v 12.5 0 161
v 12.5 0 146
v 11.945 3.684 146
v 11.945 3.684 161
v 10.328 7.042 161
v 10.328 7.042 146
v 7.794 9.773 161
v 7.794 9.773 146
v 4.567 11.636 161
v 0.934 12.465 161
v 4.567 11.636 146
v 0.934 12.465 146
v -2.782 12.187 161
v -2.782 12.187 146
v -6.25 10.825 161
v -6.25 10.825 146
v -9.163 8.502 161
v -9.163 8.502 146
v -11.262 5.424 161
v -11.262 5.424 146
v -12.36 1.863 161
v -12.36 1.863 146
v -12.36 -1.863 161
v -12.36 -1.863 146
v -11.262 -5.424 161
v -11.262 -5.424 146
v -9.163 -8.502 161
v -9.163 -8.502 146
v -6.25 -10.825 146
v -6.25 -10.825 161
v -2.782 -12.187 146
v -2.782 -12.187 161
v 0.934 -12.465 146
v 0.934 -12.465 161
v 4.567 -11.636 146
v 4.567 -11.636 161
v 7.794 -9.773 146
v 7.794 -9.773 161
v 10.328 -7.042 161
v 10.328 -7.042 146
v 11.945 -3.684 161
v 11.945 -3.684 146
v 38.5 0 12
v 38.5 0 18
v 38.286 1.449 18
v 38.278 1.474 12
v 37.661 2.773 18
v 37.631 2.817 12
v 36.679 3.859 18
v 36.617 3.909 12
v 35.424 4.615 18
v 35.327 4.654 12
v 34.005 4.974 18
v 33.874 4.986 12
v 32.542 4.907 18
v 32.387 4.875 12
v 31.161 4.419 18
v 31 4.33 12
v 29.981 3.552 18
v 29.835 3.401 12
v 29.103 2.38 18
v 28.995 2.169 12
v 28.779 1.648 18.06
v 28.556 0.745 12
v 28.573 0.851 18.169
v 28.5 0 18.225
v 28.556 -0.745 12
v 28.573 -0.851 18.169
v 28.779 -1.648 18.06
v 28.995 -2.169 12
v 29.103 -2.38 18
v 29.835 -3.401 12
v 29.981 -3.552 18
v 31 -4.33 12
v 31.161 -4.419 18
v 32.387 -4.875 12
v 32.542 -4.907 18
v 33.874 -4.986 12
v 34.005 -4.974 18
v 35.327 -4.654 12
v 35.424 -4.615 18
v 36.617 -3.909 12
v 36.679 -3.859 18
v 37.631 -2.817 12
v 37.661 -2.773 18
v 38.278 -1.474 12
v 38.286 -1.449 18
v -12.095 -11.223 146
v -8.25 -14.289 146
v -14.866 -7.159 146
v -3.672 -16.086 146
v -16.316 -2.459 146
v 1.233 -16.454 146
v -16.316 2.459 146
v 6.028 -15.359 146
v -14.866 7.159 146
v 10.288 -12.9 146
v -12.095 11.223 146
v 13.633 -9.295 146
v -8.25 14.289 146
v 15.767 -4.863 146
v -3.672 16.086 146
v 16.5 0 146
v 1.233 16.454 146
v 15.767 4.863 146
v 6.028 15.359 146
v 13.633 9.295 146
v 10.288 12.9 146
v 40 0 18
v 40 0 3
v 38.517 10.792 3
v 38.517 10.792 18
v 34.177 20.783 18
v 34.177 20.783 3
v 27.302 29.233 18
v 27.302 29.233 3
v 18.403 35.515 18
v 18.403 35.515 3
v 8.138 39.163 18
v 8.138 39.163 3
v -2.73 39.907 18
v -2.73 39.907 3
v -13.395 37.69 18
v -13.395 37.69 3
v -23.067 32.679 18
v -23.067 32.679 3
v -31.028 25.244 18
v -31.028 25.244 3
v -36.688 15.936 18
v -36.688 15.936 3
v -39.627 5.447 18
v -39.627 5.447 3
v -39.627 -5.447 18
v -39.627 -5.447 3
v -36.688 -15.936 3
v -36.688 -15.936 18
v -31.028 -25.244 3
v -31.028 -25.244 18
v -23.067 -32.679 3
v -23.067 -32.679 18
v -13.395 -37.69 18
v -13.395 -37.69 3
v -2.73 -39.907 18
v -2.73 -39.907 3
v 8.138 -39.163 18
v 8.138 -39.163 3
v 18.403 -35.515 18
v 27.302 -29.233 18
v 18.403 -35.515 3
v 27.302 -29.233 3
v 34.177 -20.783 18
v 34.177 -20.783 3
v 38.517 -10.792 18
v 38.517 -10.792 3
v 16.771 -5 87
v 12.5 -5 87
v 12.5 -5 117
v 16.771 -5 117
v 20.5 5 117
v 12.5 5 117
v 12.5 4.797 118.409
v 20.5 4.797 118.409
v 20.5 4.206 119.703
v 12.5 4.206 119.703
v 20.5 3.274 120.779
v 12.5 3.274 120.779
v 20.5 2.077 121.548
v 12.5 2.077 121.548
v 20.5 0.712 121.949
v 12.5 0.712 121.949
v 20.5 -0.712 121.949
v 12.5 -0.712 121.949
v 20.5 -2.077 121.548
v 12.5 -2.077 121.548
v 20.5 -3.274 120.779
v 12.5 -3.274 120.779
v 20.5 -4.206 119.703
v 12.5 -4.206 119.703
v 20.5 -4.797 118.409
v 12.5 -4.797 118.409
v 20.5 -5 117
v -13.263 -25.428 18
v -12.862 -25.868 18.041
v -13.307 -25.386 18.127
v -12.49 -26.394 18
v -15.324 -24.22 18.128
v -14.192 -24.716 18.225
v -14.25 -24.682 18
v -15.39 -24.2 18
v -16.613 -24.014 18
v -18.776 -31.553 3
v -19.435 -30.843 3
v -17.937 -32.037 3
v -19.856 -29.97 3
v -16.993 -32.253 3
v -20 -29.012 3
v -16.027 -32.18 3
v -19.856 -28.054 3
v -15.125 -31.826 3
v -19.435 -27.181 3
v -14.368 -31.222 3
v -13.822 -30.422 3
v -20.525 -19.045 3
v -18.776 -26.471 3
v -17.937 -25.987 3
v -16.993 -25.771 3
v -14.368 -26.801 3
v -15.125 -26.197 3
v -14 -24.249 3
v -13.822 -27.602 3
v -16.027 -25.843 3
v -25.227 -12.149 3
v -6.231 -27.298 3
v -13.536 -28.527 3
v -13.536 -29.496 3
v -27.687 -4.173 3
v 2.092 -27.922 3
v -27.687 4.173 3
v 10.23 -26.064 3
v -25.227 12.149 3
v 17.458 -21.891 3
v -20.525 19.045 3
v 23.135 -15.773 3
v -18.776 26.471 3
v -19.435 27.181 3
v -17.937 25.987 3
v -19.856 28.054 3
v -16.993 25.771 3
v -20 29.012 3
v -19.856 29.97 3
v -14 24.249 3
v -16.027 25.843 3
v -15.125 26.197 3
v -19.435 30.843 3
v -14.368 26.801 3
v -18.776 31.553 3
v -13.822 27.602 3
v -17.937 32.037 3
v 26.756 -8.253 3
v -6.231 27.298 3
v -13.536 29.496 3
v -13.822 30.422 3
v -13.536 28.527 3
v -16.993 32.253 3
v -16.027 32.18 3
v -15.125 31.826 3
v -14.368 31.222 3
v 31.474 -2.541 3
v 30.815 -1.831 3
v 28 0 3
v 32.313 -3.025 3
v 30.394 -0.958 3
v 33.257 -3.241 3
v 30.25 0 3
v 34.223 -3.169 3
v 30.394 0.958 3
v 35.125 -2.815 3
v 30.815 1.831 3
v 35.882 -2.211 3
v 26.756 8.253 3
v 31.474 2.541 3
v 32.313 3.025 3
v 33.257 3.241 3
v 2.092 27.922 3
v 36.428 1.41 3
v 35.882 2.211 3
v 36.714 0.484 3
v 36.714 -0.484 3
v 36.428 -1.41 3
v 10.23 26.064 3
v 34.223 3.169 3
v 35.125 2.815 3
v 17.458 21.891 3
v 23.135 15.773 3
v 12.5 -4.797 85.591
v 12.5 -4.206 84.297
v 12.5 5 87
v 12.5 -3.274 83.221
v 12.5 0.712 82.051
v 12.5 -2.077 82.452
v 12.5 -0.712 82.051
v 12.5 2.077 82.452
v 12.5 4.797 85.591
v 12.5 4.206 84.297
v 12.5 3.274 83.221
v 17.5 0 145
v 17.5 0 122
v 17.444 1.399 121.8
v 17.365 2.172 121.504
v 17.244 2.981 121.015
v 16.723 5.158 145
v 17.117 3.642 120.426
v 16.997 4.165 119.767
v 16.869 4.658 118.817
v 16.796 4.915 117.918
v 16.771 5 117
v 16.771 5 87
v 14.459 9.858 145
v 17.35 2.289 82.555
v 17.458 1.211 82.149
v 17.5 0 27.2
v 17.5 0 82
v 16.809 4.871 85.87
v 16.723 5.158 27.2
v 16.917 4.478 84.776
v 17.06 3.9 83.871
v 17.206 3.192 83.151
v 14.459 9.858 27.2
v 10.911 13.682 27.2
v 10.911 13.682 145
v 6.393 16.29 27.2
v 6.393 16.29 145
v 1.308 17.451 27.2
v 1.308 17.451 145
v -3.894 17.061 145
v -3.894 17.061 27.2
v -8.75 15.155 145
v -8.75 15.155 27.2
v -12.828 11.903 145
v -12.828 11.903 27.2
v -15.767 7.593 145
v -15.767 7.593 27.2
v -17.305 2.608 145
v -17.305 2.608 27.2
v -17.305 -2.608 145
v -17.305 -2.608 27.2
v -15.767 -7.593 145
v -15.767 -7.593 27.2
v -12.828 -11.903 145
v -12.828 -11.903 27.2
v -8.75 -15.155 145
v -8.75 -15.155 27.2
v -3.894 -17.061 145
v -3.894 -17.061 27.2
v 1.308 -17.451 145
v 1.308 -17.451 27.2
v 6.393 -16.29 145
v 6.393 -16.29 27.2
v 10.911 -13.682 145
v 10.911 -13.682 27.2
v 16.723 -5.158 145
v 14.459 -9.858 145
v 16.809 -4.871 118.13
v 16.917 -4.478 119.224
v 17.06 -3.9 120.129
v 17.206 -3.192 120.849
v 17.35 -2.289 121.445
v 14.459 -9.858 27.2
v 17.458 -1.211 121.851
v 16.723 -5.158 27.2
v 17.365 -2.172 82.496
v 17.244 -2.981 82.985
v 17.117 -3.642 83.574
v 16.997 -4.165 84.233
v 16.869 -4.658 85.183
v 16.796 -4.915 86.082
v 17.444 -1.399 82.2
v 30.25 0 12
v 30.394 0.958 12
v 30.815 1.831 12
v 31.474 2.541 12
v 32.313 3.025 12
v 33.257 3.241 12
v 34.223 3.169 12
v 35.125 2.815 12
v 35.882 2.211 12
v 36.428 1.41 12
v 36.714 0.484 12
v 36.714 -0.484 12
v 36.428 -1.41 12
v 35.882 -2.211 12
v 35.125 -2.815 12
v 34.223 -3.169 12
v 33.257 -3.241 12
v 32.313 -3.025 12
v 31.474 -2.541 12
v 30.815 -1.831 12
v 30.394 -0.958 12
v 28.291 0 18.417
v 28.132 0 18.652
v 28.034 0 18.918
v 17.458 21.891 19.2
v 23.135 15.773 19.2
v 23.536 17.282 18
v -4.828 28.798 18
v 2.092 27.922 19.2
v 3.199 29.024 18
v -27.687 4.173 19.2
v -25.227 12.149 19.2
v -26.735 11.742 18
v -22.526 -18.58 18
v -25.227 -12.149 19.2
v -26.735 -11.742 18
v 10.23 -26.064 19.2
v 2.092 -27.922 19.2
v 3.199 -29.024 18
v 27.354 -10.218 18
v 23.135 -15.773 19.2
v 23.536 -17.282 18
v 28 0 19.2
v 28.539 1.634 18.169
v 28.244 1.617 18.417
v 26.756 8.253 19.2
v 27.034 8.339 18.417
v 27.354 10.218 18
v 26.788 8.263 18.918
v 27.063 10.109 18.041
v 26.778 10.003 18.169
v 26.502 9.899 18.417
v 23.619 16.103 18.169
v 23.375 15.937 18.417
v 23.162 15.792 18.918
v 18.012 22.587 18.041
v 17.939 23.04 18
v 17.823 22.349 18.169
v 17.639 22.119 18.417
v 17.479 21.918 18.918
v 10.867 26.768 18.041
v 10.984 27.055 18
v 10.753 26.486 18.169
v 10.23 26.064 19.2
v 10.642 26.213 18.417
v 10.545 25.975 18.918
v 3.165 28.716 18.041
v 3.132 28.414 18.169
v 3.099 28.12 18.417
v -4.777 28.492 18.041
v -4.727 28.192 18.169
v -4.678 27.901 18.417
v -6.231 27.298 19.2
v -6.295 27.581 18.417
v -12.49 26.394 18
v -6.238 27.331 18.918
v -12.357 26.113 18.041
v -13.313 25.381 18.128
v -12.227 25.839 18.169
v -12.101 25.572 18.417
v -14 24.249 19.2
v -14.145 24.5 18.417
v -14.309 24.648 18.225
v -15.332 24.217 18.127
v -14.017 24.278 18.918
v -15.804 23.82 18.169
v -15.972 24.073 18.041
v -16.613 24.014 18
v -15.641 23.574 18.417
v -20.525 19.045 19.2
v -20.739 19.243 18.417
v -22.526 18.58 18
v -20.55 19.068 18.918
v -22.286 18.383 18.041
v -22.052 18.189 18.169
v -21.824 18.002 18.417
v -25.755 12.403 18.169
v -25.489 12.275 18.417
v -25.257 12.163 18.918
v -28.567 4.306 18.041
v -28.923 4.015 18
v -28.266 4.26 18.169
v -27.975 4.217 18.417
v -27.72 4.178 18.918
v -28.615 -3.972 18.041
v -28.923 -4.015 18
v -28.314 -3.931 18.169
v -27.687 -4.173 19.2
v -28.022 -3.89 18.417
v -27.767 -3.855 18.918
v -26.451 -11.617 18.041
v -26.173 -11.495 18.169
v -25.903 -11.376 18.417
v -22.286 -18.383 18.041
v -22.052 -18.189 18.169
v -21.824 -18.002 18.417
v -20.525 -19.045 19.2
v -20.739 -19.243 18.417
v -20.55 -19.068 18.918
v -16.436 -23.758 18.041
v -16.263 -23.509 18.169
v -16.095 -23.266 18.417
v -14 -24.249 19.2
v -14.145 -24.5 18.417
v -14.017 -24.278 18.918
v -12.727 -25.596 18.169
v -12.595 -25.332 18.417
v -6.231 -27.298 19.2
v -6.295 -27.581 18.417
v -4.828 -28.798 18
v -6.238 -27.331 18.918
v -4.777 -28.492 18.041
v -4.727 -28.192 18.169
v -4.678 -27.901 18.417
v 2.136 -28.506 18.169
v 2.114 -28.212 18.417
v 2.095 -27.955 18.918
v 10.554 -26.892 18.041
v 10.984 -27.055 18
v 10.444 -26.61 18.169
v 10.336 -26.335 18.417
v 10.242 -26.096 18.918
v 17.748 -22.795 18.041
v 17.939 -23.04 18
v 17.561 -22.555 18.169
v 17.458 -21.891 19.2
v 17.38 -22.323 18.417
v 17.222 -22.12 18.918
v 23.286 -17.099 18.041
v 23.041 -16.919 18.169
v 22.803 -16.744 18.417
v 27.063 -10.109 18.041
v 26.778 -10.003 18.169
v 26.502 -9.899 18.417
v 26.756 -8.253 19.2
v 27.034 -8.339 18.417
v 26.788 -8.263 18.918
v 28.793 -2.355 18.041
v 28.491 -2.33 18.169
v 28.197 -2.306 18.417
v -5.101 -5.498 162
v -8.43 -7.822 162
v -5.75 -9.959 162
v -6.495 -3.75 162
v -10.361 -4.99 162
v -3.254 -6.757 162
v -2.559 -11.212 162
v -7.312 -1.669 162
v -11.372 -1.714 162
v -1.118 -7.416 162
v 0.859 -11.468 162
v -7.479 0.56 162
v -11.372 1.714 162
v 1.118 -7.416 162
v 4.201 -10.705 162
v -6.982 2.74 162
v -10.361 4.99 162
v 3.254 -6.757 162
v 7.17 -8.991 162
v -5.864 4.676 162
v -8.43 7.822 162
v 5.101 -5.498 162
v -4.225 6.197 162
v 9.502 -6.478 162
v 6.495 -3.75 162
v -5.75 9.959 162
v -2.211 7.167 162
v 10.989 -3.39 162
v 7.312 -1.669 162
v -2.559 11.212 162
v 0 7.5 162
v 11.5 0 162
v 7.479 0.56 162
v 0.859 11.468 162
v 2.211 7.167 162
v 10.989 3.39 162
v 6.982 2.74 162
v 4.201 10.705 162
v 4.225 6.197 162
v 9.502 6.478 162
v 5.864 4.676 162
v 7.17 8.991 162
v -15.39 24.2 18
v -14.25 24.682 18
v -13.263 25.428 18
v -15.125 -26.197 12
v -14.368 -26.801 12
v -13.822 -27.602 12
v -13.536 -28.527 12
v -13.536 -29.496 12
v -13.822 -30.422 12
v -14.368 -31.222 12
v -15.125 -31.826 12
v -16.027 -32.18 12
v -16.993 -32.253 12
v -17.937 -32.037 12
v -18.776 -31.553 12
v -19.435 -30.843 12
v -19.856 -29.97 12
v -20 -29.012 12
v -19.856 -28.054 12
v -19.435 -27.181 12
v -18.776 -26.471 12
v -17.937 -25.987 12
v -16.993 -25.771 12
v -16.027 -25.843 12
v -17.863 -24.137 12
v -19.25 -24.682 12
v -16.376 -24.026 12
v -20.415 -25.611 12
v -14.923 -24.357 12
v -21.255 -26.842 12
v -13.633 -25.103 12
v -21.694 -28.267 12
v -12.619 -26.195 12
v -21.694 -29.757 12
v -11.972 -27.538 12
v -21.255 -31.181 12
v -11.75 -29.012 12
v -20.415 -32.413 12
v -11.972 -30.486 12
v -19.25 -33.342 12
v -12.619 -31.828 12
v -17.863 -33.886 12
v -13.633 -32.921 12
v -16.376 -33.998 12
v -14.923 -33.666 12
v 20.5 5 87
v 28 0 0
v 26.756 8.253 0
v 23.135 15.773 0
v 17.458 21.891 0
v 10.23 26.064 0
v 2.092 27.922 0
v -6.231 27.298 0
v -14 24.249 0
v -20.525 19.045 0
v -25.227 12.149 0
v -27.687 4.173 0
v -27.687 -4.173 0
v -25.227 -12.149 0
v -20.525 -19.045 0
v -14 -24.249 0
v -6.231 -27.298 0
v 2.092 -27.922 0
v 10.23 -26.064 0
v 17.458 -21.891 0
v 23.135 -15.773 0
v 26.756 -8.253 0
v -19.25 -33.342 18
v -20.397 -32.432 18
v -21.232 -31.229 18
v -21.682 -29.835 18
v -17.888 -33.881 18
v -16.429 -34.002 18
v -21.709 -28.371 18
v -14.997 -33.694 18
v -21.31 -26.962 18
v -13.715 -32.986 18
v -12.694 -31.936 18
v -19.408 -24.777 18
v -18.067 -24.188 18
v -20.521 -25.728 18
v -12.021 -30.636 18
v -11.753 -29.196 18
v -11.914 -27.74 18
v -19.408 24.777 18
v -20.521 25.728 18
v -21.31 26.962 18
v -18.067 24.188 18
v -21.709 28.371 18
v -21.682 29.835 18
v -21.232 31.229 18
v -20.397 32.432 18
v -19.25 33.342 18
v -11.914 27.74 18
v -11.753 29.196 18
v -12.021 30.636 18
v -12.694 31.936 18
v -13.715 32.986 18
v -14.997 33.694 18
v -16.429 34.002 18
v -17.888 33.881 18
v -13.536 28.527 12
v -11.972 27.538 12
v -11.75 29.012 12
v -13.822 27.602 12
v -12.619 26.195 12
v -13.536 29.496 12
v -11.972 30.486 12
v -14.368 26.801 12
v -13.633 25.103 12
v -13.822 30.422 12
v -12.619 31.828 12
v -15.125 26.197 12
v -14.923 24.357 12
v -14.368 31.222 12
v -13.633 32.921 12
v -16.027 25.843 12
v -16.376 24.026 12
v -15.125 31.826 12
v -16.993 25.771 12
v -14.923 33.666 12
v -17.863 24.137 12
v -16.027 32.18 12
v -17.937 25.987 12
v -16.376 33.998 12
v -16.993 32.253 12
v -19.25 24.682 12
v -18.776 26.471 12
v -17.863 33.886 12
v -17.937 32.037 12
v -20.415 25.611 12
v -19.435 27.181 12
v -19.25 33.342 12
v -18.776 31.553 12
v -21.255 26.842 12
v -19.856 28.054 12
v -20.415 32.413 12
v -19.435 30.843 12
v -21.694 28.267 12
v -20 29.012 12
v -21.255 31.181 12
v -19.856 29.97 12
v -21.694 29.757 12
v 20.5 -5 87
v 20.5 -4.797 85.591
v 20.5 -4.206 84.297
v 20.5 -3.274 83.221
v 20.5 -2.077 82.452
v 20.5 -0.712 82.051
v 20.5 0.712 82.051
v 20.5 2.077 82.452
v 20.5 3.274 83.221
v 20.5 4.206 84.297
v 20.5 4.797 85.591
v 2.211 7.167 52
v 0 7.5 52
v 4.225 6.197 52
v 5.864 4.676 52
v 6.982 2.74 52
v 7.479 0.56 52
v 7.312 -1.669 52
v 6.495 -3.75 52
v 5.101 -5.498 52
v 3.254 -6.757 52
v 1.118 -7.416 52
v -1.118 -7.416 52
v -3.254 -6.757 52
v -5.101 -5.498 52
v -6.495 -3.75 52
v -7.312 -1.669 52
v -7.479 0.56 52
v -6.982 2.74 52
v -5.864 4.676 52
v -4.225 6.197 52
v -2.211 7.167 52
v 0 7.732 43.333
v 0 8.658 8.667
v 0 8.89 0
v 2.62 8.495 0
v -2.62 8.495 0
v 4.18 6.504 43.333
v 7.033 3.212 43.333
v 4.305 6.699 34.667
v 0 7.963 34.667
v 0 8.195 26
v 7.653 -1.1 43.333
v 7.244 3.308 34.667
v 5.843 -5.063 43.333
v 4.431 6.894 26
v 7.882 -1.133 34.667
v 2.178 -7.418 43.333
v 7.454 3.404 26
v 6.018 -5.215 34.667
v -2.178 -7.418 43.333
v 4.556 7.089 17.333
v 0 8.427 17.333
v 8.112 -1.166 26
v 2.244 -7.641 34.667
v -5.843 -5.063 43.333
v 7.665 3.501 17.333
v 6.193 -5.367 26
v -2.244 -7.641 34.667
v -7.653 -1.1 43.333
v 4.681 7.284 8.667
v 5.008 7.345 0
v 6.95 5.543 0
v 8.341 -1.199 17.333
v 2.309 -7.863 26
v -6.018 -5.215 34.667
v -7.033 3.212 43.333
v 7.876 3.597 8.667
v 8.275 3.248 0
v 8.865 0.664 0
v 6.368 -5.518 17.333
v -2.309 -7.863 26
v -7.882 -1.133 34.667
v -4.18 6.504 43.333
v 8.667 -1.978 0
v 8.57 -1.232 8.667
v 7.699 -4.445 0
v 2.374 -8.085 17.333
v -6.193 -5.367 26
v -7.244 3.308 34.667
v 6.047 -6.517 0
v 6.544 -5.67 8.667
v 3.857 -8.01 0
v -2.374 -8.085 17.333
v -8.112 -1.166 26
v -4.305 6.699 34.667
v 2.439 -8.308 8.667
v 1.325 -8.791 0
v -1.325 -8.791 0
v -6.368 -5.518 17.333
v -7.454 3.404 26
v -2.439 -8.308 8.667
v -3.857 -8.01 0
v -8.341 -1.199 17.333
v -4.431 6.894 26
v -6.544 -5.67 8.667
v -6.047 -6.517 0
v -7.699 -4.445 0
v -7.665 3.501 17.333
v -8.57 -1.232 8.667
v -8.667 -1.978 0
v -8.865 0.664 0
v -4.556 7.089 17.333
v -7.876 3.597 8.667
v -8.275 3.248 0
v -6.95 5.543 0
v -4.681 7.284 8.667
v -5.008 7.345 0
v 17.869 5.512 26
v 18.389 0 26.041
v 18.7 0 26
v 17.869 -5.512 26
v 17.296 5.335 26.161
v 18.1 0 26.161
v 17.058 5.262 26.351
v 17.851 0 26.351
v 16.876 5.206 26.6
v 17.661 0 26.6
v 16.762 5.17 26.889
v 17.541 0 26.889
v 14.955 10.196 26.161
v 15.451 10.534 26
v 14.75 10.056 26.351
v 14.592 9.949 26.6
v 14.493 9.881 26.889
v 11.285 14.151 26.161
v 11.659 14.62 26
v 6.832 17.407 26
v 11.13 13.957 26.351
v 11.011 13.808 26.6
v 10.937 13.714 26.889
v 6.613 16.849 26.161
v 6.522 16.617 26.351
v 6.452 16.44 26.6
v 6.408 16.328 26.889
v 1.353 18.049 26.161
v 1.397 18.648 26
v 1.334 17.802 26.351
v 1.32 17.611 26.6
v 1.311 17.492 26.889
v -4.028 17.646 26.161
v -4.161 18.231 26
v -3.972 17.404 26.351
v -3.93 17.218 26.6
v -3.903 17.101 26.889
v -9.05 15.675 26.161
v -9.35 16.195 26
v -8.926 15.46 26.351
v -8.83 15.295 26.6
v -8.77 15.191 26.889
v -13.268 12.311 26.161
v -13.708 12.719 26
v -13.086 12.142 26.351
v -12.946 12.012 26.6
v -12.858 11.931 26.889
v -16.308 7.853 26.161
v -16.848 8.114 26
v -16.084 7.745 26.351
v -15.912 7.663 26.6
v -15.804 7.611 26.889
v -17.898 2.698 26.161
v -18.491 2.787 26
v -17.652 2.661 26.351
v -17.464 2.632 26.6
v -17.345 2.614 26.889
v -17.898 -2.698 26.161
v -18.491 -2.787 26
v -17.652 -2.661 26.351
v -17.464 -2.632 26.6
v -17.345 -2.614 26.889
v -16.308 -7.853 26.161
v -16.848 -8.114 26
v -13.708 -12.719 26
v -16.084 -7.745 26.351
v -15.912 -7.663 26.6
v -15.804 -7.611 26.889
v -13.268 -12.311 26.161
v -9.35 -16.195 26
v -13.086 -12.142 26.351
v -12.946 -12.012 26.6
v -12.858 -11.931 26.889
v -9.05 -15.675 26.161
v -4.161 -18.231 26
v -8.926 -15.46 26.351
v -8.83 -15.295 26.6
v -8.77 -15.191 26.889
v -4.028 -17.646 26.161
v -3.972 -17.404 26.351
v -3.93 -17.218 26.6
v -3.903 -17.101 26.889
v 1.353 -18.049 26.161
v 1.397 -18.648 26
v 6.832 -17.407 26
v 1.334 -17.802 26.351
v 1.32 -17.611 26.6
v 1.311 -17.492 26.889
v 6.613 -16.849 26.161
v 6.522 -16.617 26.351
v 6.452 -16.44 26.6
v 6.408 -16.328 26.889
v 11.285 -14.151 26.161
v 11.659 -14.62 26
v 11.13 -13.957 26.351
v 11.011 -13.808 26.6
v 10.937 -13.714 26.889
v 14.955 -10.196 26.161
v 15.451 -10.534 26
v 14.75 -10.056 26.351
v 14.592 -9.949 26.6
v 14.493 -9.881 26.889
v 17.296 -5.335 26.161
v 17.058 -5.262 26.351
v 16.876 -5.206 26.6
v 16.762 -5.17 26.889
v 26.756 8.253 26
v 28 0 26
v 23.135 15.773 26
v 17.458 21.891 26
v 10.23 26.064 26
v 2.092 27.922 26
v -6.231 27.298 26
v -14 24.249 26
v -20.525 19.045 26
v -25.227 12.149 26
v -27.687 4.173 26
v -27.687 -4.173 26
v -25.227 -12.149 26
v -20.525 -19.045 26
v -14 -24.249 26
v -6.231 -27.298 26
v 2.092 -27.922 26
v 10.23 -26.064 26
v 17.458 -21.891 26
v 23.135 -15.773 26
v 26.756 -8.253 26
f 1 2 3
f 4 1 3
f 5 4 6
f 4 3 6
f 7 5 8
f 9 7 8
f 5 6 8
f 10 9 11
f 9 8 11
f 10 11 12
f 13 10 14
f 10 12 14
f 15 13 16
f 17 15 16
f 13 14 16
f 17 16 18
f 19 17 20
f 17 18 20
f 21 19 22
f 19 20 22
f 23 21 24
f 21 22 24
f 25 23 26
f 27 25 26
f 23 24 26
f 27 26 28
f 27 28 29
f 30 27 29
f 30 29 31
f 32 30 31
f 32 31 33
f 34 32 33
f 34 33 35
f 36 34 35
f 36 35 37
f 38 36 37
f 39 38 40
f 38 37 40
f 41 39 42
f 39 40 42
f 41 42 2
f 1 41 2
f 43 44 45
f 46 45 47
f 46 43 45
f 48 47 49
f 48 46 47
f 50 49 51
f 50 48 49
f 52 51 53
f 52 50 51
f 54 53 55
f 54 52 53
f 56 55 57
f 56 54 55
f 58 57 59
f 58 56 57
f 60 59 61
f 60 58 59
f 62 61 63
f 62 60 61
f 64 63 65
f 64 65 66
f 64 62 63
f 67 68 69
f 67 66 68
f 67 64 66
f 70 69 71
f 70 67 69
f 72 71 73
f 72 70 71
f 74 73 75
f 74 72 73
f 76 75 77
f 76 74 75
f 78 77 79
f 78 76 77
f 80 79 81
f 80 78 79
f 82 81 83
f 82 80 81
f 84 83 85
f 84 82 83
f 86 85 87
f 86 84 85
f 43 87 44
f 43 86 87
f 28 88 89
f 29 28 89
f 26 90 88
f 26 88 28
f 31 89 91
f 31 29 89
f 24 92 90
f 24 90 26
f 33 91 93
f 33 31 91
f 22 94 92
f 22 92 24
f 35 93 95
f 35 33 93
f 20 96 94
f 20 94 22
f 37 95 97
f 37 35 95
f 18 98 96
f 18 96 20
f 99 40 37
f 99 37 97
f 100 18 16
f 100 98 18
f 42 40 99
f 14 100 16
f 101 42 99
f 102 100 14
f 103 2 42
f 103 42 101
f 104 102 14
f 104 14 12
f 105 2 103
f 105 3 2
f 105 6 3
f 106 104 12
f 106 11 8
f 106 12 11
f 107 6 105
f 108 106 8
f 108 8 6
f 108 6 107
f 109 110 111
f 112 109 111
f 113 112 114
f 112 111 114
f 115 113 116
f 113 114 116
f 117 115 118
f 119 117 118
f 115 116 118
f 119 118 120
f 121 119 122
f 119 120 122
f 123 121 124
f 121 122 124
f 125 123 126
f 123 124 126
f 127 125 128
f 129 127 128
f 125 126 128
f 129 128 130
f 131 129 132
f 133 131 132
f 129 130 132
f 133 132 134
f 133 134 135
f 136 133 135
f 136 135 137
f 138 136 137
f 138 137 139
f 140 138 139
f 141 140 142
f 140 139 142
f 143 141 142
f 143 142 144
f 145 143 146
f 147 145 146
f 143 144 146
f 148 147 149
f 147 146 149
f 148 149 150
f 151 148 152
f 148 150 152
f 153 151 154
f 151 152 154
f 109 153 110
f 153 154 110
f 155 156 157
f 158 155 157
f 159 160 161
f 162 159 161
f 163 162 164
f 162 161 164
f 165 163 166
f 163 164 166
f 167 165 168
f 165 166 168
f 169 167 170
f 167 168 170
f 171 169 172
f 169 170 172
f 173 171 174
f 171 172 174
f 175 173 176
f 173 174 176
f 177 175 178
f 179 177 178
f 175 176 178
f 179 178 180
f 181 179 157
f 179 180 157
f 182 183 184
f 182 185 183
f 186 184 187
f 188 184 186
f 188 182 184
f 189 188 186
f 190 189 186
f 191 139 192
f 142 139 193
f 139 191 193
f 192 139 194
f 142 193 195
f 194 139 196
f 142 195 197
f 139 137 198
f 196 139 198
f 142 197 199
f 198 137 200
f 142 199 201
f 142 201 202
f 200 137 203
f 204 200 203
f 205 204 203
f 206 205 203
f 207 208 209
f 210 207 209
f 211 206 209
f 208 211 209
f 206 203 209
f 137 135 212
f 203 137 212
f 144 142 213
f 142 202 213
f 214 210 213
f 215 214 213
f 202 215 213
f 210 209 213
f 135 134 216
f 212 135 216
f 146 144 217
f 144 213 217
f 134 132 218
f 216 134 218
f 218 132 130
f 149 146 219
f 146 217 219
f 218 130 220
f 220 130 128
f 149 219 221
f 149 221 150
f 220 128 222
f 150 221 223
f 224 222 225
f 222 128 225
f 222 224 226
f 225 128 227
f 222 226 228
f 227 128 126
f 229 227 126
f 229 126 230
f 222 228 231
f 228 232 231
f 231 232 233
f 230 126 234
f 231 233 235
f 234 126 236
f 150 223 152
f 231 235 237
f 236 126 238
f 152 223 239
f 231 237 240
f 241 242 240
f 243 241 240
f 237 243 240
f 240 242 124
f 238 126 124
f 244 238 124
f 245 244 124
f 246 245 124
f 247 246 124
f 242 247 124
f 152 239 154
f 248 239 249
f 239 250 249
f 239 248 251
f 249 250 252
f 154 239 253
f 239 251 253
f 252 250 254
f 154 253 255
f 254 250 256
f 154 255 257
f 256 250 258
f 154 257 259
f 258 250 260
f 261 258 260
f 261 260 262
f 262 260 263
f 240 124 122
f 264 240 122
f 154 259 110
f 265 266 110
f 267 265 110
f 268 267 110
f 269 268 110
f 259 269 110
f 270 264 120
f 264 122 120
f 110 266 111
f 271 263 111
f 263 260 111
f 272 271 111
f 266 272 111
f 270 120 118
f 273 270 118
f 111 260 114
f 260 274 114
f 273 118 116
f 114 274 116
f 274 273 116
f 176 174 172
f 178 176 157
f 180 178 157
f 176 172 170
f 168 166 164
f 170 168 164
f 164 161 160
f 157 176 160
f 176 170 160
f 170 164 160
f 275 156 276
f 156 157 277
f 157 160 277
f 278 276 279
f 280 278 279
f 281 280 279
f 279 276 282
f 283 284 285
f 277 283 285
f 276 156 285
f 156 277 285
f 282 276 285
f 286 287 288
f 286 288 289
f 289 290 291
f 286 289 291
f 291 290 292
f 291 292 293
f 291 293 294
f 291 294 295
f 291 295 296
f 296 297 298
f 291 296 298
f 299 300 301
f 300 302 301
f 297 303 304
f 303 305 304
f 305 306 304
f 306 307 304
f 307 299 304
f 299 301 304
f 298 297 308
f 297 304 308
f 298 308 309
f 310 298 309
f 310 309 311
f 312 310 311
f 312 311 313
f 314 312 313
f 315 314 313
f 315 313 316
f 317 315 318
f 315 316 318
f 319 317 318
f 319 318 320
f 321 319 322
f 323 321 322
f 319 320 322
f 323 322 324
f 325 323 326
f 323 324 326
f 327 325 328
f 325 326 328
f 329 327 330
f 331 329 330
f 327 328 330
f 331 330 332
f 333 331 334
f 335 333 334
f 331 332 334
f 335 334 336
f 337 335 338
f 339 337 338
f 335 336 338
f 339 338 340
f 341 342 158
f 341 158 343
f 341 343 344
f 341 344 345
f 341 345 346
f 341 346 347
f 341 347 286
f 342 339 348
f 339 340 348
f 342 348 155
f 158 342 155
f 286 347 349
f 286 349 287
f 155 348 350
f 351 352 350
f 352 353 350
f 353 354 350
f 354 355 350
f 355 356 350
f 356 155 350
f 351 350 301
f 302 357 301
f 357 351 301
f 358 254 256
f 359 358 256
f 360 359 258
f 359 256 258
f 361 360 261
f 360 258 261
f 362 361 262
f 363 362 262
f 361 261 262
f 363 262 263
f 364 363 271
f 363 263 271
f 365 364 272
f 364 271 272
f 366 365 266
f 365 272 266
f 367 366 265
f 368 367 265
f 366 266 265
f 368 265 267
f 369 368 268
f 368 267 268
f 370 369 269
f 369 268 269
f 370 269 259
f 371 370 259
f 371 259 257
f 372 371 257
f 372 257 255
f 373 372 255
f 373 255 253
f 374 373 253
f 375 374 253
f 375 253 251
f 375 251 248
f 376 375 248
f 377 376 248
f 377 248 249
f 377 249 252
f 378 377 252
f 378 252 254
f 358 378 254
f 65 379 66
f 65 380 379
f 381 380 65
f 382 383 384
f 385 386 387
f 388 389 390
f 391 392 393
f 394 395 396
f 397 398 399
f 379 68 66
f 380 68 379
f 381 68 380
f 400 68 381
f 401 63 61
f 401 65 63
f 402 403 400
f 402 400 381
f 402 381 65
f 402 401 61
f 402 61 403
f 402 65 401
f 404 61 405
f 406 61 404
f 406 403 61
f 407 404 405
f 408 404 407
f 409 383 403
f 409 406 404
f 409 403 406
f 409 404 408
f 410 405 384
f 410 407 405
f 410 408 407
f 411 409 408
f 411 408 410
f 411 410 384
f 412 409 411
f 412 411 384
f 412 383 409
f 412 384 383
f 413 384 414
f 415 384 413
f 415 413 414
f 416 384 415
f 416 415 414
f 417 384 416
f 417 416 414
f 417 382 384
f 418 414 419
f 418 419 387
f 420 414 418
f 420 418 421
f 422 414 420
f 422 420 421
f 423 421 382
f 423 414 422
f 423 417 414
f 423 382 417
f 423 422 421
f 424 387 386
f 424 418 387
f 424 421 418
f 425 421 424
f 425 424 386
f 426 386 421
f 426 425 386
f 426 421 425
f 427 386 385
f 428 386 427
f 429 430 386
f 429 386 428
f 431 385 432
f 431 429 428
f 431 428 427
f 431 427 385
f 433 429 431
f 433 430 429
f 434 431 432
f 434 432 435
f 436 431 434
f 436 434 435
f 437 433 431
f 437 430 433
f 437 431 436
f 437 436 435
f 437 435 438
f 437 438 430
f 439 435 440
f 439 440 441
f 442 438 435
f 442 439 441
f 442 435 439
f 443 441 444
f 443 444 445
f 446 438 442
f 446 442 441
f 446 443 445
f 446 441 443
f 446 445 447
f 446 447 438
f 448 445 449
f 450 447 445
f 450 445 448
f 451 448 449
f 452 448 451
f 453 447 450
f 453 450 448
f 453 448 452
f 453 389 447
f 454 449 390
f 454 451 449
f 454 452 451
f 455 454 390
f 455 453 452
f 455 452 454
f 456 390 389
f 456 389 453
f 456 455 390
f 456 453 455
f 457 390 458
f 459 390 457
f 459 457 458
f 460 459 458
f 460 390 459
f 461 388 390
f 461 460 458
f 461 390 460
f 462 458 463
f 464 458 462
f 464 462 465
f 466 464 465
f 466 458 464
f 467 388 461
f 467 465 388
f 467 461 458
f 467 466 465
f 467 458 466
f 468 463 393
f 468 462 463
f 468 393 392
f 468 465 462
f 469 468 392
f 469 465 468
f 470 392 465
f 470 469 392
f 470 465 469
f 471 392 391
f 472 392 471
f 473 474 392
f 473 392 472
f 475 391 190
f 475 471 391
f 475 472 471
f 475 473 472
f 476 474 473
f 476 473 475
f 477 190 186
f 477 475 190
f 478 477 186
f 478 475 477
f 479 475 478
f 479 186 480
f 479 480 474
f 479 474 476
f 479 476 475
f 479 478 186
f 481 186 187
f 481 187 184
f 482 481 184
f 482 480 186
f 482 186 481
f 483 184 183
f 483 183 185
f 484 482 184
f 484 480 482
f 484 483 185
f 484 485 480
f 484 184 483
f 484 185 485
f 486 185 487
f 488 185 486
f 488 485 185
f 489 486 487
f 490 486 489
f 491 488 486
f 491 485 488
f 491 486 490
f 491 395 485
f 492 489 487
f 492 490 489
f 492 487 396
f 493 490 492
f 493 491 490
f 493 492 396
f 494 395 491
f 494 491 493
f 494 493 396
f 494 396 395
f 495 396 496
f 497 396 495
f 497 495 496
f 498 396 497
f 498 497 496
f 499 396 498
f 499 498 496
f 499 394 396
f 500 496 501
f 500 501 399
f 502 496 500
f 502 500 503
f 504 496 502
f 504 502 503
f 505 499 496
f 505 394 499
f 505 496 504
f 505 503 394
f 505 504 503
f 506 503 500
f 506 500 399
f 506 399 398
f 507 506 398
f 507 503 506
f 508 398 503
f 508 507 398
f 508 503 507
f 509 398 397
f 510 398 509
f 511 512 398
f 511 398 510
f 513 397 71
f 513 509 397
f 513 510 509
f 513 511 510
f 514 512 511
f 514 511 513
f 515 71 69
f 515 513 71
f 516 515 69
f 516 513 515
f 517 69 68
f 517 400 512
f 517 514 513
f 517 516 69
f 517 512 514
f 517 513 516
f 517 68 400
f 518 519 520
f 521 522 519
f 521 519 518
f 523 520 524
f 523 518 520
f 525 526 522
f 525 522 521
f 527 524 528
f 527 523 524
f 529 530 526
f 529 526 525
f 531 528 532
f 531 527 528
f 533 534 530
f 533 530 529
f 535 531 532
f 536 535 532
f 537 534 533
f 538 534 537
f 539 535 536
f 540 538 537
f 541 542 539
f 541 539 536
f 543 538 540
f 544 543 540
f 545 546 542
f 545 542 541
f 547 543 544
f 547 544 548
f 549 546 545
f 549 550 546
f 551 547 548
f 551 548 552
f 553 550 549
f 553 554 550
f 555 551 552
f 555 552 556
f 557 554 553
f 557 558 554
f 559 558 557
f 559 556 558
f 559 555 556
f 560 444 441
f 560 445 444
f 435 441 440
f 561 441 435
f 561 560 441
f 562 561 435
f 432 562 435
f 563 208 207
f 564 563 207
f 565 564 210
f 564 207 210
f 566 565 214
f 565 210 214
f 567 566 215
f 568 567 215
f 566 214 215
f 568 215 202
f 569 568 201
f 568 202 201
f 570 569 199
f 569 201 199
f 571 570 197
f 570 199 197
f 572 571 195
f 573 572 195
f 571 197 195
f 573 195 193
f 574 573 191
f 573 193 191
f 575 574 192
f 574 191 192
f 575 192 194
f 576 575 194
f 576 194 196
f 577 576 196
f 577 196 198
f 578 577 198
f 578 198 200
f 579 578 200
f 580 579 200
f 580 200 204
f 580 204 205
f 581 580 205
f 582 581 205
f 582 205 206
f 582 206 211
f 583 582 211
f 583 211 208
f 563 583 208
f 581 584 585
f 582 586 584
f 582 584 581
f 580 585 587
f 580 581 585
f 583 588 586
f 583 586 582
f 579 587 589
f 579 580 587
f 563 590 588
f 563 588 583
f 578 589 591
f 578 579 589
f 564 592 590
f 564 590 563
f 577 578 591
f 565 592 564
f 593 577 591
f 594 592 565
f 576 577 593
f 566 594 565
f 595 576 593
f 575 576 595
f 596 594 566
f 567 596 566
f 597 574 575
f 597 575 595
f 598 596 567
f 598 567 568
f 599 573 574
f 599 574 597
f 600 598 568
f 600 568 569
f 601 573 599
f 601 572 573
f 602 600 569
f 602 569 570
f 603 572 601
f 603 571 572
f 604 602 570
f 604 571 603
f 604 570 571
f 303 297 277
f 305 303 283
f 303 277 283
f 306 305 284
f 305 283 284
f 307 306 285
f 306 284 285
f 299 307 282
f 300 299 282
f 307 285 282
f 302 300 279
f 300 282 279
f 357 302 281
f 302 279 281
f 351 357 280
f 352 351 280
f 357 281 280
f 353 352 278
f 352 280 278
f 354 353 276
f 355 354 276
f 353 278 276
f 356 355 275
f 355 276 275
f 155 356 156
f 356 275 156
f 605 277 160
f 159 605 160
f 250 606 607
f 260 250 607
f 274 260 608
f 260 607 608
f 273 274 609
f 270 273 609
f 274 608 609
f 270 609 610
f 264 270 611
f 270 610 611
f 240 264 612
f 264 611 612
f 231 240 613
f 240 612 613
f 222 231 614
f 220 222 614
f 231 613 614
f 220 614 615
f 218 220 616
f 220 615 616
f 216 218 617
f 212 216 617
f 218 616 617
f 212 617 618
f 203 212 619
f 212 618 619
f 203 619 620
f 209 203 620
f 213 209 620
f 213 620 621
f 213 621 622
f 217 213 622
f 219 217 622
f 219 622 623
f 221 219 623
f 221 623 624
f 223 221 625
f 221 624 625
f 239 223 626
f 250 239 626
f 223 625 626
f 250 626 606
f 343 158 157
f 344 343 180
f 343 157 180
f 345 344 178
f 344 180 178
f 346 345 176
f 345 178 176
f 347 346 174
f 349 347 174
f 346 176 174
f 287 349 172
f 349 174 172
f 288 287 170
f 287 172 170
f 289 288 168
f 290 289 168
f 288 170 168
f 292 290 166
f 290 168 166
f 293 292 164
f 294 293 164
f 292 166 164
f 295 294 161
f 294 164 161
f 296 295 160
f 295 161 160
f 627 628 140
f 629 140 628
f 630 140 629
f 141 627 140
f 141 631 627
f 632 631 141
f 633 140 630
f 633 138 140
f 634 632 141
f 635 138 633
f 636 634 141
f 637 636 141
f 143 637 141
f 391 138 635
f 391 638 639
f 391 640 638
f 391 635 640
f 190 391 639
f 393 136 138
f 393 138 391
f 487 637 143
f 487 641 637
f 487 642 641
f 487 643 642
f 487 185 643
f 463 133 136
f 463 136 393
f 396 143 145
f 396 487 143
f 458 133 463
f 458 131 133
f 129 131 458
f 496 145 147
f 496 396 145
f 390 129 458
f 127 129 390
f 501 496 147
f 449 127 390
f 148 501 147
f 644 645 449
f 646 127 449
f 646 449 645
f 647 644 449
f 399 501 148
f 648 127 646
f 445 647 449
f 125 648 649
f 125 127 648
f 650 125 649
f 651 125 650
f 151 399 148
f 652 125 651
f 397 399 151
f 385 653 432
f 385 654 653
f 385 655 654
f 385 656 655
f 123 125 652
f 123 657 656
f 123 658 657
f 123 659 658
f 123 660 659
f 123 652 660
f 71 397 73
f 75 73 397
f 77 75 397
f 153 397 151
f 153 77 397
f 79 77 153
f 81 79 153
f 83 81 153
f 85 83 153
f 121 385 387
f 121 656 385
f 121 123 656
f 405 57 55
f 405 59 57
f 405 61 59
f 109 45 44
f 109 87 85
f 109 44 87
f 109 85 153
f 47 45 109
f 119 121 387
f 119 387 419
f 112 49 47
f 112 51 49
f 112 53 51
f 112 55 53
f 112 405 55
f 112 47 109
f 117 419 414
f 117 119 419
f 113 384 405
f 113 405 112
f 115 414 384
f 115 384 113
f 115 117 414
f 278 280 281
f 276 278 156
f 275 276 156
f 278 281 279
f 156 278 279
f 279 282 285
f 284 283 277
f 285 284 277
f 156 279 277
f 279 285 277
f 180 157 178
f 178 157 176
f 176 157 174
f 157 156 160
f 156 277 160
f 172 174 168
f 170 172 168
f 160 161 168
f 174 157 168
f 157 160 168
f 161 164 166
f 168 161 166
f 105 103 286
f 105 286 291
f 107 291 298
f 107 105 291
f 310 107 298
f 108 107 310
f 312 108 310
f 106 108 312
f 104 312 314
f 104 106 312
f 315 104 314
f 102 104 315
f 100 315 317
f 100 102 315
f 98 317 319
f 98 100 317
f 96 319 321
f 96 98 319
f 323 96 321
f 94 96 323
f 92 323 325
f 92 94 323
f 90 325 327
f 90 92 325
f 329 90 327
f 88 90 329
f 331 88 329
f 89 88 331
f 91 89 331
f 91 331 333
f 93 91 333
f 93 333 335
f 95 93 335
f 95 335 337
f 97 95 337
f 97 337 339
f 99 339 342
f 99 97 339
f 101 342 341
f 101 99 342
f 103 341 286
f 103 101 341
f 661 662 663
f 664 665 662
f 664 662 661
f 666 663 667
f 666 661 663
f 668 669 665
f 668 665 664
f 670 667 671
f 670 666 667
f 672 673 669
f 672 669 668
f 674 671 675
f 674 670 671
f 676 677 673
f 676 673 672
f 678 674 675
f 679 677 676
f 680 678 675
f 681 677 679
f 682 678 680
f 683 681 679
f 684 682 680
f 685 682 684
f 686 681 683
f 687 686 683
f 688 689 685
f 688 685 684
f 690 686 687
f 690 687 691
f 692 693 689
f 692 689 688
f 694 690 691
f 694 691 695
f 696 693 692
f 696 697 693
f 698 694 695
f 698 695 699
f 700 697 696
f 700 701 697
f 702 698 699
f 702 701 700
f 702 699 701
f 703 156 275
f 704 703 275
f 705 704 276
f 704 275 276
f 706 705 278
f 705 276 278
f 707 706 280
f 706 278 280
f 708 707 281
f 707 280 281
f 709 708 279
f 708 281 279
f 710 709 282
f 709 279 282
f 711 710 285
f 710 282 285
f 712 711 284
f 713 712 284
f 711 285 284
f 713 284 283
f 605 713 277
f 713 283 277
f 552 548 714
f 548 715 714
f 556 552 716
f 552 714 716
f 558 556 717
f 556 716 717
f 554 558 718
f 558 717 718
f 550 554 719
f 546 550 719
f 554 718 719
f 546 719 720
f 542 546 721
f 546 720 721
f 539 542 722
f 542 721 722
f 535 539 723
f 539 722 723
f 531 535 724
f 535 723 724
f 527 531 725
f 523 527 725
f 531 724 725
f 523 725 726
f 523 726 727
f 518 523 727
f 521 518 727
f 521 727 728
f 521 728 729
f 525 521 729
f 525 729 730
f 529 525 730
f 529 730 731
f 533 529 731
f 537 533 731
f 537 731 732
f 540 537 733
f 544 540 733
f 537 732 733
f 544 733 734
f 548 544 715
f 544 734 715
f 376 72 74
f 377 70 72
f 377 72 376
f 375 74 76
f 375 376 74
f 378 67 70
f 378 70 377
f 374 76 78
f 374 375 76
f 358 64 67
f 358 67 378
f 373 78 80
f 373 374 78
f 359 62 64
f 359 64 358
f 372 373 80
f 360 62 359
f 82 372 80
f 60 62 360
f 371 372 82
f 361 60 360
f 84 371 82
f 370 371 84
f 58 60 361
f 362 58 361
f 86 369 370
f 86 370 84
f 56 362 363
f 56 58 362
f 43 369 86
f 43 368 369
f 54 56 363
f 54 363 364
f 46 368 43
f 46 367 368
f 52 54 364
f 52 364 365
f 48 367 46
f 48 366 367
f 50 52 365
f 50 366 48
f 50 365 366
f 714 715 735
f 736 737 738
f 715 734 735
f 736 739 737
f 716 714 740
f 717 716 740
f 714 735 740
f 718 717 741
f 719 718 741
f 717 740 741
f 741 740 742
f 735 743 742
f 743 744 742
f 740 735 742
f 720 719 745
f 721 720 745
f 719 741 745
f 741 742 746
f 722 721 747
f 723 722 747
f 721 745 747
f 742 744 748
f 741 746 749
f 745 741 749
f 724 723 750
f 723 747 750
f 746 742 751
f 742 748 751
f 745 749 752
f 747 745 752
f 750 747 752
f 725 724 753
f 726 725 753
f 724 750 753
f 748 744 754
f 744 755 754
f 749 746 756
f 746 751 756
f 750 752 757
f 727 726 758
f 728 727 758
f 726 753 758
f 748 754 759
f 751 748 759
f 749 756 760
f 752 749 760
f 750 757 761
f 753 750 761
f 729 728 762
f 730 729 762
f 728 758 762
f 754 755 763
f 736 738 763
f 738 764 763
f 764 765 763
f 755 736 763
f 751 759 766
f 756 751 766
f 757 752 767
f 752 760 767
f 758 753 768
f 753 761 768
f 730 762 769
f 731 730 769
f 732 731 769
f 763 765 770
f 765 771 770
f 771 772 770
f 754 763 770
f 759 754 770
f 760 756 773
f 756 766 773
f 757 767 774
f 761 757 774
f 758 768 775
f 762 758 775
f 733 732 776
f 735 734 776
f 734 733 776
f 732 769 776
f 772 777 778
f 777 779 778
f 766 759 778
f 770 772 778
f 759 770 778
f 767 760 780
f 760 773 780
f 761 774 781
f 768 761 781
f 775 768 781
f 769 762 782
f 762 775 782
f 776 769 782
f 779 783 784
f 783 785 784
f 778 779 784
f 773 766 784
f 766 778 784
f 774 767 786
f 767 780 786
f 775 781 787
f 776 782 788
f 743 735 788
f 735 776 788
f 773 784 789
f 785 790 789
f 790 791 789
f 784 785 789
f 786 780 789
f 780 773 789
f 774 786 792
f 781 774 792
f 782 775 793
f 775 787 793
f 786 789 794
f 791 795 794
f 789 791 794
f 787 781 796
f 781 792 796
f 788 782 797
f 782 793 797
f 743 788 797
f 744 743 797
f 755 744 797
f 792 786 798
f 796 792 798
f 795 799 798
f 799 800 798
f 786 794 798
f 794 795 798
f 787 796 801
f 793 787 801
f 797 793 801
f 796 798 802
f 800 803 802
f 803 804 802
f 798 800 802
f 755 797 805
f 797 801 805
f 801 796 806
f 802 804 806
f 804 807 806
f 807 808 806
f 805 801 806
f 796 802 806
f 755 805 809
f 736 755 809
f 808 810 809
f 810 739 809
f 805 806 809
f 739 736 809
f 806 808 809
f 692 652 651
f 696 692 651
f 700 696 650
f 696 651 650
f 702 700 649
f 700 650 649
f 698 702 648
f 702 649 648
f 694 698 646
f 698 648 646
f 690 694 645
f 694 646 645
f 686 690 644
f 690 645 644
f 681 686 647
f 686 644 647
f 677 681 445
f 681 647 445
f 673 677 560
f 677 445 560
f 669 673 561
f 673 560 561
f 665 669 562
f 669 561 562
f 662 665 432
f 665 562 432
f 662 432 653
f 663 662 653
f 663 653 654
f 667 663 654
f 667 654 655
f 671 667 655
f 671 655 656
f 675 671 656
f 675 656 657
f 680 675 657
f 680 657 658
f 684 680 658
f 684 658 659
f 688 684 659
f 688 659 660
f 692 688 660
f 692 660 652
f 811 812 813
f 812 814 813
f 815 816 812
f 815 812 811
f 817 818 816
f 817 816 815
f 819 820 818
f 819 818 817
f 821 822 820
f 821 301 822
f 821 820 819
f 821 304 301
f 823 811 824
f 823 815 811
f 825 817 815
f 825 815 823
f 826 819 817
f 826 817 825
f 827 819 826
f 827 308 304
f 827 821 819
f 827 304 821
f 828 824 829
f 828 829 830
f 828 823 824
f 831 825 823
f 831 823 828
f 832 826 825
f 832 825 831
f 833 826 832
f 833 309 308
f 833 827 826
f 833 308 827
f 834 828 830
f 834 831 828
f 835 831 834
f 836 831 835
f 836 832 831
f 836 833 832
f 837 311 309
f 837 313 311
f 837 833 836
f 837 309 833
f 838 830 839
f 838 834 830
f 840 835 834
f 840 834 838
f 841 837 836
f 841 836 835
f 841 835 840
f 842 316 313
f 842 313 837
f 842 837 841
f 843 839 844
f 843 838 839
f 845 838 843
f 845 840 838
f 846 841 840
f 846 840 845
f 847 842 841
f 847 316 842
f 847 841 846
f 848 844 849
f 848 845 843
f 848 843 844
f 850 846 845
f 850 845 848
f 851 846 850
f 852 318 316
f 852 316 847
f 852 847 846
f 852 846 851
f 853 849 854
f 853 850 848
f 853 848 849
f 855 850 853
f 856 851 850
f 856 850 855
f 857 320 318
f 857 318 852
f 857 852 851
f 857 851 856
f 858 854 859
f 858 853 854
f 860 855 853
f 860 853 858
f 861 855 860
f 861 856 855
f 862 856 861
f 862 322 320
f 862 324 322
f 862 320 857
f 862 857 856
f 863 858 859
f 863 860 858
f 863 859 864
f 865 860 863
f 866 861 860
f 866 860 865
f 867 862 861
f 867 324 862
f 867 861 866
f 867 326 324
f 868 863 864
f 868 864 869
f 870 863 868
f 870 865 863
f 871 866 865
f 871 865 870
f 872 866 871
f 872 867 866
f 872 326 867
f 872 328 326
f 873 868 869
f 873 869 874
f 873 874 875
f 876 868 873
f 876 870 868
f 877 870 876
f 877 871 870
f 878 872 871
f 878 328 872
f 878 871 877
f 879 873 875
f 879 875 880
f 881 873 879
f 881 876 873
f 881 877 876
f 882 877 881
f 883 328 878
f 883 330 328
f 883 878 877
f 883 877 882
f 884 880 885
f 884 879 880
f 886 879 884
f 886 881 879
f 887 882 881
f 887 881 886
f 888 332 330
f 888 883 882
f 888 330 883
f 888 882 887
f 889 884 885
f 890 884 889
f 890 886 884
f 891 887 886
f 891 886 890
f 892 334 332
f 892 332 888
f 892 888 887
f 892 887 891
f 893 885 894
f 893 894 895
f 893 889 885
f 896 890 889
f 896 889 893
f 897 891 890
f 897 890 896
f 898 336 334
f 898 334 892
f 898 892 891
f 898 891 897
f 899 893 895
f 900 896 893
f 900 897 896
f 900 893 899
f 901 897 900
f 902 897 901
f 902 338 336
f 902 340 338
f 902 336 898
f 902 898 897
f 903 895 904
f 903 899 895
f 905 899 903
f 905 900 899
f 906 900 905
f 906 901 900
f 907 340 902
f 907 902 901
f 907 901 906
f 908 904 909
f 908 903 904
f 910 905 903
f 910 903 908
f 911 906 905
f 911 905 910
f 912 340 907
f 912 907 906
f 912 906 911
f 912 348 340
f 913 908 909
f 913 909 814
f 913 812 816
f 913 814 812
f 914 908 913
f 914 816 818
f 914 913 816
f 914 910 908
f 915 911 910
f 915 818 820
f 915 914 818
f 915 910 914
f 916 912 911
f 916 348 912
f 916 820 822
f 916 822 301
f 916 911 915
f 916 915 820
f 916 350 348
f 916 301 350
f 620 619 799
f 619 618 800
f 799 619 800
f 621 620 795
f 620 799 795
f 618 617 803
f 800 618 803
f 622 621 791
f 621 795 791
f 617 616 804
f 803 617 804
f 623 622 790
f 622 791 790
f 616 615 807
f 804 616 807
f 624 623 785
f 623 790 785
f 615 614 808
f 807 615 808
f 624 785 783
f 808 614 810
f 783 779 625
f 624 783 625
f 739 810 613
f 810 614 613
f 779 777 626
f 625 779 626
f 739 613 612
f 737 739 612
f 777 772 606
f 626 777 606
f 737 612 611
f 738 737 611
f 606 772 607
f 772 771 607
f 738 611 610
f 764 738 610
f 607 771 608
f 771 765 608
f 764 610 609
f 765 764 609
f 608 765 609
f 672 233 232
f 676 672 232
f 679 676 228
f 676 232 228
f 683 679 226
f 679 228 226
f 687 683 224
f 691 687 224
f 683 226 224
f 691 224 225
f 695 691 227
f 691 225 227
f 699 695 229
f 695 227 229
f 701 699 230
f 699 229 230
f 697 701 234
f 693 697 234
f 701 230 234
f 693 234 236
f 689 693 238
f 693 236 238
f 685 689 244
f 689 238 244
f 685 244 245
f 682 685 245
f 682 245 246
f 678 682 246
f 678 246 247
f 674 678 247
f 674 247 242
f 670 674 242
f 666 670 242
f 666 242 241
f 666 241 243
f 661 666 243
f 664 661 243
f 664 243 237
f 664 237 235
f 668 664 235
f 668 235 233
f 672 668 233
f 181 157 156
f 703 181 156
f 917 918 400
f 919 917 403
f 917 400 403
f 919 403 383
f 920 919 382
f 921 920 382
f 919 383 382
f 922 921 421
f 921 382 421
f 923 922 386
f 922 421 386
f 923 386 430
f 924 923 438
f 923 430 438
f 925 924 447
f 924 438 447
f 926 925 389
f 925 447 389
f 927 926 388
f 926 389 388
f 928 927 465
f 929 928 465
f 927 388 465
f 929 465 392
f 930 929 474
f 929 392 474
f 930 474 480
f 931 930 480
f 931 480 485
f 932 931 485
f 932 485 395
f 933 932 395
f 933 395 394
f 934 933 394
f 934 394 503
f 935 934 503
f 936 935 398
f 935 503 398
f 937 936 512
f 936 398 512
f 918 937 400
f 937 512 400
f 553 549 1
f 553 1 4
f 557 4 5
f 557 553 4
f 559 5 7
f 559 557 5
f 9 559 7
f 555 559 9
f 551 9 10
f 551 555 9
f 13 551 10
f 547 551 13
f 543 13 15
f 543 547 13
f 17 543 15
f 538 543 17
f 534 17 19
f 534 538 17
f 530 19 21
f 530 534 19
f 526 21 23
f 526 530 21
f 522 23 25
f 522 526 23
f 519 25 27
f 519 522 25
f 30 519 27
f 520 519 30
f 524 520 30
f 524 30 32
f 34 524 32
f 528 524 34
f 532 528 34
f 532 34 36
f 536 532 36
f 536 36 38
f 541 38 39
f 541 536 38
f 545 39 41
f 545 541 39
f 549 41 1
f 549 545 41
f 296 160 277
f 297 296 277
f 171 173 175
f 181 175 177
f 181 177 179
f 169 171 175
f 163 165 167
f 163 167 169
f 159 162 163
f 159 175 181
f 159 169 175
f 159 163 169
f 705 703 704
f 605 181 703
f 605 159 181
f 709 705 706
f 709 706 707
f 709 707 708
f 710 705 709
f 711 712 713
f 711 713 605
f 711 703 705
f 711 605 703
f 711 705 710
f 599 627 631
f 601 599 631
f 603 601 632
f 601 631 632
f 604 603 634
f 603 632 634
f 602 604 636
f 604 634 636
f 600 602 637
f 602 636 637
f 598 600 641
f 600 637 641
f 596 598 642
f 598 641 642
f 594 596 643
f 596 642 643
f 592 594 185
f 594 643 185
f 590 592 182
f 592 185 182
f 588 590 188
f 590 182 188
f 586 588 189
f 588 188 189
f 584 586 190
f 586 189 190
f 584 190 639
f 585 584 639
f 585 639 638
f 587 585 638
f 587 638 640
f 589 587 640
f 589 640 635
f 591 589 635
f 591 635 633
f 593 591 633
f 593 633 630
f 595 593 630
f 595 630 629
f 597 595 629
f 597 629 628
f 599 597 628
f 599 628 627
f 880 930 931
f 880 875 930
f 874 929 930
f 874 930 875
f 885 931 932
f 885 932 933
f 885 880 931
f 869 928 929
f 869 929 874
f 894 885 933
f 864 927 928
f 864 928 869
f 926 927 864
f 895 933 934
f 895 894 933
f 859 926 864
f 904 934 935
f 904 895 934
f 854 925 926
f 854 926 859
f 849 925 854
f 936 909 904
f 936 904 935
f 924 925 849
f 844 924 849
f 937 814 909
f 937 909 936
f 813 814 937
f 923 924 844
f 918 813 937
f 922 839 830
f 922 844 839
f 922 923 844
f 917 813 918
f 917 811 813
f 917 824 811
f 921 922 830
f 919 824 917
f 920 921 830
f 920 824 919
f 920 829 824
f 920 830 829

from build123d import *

# Parameters (mm, degrees)
CROQUIS1_R              = 28
SALIENTE_EXTRUIR1_DEPTH = 3
CROQUIS2_R              = 40
SALIENTE_EXTRUIR2_DEPTH = 15
CROQUIS3_R              = 28
SALIENTE_EXTRUIR3_DEPTH = 8
CROQUIS4_R              = 17.5
SALIENTE_EXTRUIR4_DEPTH = 120
CROQUIS5_R              = 12.5
SALIENTE_EXTRUIR5_DEPTH = 16
REDONDEO1_R             = 1.2
CHAFL_N1_SIZE           = 1
CORTAR_EXTRUIR1_START   = 12.5
CORTAR_EXTRUIR1_DEPTH   = 33.2
CROQUIS8_R              = 3.25
CORTAR_EXTRUIR2_DEPTH   = 33.2
MATRIZC1_COUNT          = 3
CROQUIS9_R              = 5
CORTAR_EXTRUIR3_DEPTH   = 6
MATRIZC2_COUNT          = 3
CROQUIS10_R             = 5
CORTAR_EXTRUIR4_DEPTH   = 23.5
MATRIZC3_COUNT          = 3
SALIENTE_EXTRUIR6_DEPTH = 8


with BuildPart() as part:
    # Croquis1 → Saliente-Extruir1 (new body)
    with BuildSketch(Plane.XY):
        Circle(CROQUIS1_R)
    extrude(amount=SALIENTE_EXTRUIR1_DEPTH)

    # Croquis2 → Saliente-Extruir2 (add)
    with BuildSketch(Plane.XY.offset(3)):
        Circle(CROQUIS2_R)
    extrude(amount=SALIENTE_EXTRUIR2_DEPTH)

    # Croquis3 → Saliente-Extruir3 (add)
    with BuildSketch(Plane.XY.offset(18)):
        Circle(CROQUIS3_R)
    extrude(amount=SALIENTE_EXTRUIR3_DEPTH)

    # Croquis4 → Saliente-Extruir4 (add)
    with BuildSketch(Plane.XY.offset(26)):
        Circle(CROQUIS4_R)
    extrude(amount=SALIENTE_EXTRUIR4_DEPTH)

    # Croquis5 → Saliente-Extruir5 (add)
    with BuildSketch(Plane.XY.offset(146)):
        Circle(CROQUIS5_R)
    extrude(amount=SALIENTE_EXTRUIR5_DEPTH)

    # Redondeo1
    redondeo1_edges = [part.edges().sort_by_distance(p)[0] for p in [
        (-28, 0, 18),
        (-17.5, 0, 26),
    ]]
    fillet(redondeo1_edges, radius=REDONDEO1_R)

    # Chaflán1
    chafl_n1_edges = [part.edges().sort_by_distance(p)[0] for p in [
        (-17.5, 0, 146),
        (-12.5, 0, 162),
    ]]
    chamfer(chafl_n1_edges, length=CHAFL_N1_SIZE)

    # Croquis6 → Cortar-Extruir1 (cut)
    with BuildSketch(Plane(origin=(0, 0, 0), x_dir=(0, 0, -1), z_dir=(1, 0, 0)).offset(CORTAR_EXTRUIR1_START)):
        with BuildLine():
            Line((-117, 5), (-87, 5))
            ThreePointArc((-87, 5), (-82, 0), (-87, -5))
            Line((-87, -5), (-117, -5))
            ThreePointArc((-117, -5), (-122, 0), (-117, 5))
        make_face()
    extrude(amount=CORTAR_EXTRUIR1_DEPTH, mode=Mode.SUBTRACT)

    # Croquis7 → Cortar-Revolución1 (revolve, cut)
    with BuildSketch(Plane(origin=(0, 0, 0), x_dir=(0, 0, -1), z_dir=(1, 0, 0))):
        Polygon((-162, 0), (-162, 7.5), (-52, 7.5), (0, 8.89), (0, 0), align=None)
    revolve(axis=Axis((0, 0, 161), (0, 0, -1)), mode=Mode.SUBTRACT)

    # Croquis8 → Cortar-Extruir2 (cut)
    with BuildSketch(Plane(origin=(0, 0, 3), x_dir=(-1, 0, 0), z_dir=(0, 0, -1))):
        with Locations((-33.5, 0)):
            Circle(CROQUIS8_R)
    cortar_extruir2 = extrude(amount=-CORTAR_EXTRUIR2_DEPTH, mode=Mode.SUBTRACT)

    # MatrizC1: Cortar-Extruir2 ×3 about axis
    matrizc1_axis = Axis((0, 0, 0), (0, 0, 1))
    for i in range(1, MATRIZC1_COUNT):
        add(cortar_extruir2.rotate(matrizc1_axis, i * 360 / MATRIZC1_COUNT), mode=Mode.SUBTRACT)

    # Croquis9 → Cortar-Extruir3 (cut)
    with BuildSketch(Plane.XY.offset(18)):
        with Locations((33.5, 0)):
            Circle(CROQUIS9_R)
    cortar_extruir3 = extrude(amount=-CORTAR_EXTRUIR3_DEPTH, mode=Mode.SUBTRACT)

    # MatrizC2: Cortar-Extruir3 ×3 about axis
    matrizc2_axis = Axis((0, 0, 0), (0, 0, 1))
    for i in range(1, MATRIZC2_COUNT):
        add(cortar_extruir3.rotate(matrizc2_axis, i * 360 / MATRIZC2_COUNT), mode=Mode.SUBTRACT)

    # Croquis10 → Cortar-Extruir4 (cut)
    with BuildSketch(Plane.XY.offset(12)):
        with Locations((33.5, 0)):
            Circle(CROQUIS10_R)
    cortar_extruir4 = extrude(amount=CORTAR_EXTRUIR4_DEPTH, mode=Mode.SUBTRACT)

    # MatrizC3: Cortar-Extruir4 ×3 about axis
    matrizc3_axis = Axis((0, 0, 146), (0, 0, -1))
    for i in range(1, MATRIZC3_COUNT):
        add(cortar_extruir4.rotate(matrizc3_axis, i * 360 / MATRIZC3_COUNT), mode=Mode.SUBTRACT)


with BuildPart() as body_2:
    # Croquis11 → Saliente-Extruir6 (new body)
    with BuildSketch(Plane(origin=(12.5, 0, 0), x_dir=(0, 0, -1), z_dir=(1, 0, 0))):
        with BuildLine():
            Line((-117, -5), (-87, -5))
            ThreePointArc((-87, -5), (-82, 0), (-87, 5))
            Line((-87, 5), (-117, 5))
            ThreePointArc((-117, 5), (-122, 0), (-117, -5))
        make_face()
    extrude(amount=SALIENTE_EXTRUIR6_DEPTH)


solid = Compound([part.part, body_2.part])
